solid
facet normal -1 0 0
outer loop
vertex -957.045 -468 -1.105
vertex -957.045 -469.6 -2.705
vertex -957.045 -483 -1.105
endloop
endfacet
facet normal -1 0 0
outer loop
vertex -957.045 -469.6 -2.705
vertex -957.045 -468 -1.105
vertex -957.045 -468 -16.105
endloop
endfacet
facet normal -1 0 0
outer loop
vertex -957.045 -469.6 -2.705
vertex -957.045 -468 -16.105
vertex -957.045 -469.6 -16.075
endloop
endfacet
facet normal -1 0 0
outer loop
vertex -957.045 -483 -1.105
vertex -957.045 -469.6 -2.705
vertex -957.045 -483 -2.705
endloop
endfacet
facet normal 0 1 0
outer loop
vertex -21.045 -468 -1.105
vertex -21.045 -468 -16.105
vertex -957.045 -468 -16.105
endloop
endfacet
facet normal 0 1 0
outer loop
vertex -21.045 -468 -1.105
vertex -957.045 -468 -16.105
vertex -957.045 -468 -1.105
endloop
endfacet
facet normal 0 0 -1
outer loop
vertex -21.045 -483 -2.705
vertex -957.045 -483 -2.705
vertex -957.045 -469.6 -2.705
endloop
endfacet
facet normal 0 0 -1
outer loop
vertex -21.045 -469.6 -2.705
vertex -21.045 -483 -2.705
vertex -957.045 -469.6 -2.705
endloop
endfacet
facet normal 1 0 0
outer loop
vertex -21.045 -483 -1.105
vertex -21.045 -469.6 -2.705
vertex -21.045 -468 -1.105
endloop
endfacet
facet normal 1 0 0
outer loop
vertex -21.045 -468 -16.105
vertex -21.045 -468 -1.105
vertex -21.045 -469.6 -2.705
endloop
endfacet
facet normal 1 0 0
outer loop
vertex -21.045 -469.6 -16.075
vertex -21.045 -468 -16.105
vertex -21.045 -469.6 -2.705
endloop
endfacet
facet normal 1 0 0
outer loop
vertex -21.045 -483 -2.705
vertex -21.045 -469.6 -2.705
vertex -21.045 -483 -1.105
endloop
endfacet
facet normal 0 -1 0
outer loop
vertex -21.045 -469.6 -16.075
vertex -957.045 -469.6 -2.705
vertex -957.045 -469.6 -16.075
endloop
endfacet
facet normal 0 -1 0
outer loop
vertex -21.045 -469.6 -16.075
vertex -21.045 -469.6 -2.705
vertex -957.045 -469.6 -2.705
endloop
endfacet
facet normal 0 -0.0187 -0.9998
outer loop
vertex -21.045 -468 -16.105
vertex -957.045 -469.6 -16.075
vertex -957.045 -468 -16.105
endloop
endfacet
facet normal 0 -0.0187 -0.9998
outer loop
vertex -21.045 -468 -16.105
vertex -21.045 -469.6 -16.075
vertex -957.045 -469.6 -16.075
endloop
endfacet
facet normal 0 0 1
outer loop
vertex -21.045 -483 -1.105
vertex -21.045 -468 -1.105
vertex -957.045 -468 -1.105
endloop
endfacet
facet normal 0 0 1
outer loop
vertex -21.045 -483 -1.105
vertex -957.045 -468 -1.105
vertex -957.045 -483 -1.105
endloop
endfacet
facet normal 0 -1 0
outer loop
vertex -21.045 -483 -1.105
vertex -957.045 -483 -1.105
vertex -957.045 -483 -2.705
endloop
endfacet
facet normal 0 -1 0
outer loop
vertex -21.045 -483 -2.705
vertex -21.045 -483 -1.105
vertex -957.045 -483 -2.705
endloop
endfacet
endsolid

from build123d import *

# Parameters (mm, degrees)
F1_DEPTH = 468
F2_ANGLE = 180
F3_ANGLE = 90


with BuildPart() as f1:
    # F0 (on Front) → F1 (new body, symmetric)
    with BuildSketch(Plane.XZ):
        Polygon((-19.4449553564, 13.8652742597), (-21.0449553564, 13.8951456954), (-21.0449553564, -1.1048543046), (-6.0449553564, -1.1048543046), (-6.0449553564, 0.4951456954), (-19.4449553564, 0.4951456954), align=None)
    extrude(amount=F1_DEPTH, both=True)


with BuildPart() as f1_1:
    # F2: moved
    add(f1.part.rotate(Axis((-21.0449553564, 0, -1.1048543046), (0, -1, 0)), F2_ANGLE))


with BuildPart() as f1_2:
    # F3: moved
    add(f1_1.part.rotate(Axis((-21.0449553564, -468, -8.6048543046), (0, 0, 1)), F3_ANGLE))


solid = f1_2.part
